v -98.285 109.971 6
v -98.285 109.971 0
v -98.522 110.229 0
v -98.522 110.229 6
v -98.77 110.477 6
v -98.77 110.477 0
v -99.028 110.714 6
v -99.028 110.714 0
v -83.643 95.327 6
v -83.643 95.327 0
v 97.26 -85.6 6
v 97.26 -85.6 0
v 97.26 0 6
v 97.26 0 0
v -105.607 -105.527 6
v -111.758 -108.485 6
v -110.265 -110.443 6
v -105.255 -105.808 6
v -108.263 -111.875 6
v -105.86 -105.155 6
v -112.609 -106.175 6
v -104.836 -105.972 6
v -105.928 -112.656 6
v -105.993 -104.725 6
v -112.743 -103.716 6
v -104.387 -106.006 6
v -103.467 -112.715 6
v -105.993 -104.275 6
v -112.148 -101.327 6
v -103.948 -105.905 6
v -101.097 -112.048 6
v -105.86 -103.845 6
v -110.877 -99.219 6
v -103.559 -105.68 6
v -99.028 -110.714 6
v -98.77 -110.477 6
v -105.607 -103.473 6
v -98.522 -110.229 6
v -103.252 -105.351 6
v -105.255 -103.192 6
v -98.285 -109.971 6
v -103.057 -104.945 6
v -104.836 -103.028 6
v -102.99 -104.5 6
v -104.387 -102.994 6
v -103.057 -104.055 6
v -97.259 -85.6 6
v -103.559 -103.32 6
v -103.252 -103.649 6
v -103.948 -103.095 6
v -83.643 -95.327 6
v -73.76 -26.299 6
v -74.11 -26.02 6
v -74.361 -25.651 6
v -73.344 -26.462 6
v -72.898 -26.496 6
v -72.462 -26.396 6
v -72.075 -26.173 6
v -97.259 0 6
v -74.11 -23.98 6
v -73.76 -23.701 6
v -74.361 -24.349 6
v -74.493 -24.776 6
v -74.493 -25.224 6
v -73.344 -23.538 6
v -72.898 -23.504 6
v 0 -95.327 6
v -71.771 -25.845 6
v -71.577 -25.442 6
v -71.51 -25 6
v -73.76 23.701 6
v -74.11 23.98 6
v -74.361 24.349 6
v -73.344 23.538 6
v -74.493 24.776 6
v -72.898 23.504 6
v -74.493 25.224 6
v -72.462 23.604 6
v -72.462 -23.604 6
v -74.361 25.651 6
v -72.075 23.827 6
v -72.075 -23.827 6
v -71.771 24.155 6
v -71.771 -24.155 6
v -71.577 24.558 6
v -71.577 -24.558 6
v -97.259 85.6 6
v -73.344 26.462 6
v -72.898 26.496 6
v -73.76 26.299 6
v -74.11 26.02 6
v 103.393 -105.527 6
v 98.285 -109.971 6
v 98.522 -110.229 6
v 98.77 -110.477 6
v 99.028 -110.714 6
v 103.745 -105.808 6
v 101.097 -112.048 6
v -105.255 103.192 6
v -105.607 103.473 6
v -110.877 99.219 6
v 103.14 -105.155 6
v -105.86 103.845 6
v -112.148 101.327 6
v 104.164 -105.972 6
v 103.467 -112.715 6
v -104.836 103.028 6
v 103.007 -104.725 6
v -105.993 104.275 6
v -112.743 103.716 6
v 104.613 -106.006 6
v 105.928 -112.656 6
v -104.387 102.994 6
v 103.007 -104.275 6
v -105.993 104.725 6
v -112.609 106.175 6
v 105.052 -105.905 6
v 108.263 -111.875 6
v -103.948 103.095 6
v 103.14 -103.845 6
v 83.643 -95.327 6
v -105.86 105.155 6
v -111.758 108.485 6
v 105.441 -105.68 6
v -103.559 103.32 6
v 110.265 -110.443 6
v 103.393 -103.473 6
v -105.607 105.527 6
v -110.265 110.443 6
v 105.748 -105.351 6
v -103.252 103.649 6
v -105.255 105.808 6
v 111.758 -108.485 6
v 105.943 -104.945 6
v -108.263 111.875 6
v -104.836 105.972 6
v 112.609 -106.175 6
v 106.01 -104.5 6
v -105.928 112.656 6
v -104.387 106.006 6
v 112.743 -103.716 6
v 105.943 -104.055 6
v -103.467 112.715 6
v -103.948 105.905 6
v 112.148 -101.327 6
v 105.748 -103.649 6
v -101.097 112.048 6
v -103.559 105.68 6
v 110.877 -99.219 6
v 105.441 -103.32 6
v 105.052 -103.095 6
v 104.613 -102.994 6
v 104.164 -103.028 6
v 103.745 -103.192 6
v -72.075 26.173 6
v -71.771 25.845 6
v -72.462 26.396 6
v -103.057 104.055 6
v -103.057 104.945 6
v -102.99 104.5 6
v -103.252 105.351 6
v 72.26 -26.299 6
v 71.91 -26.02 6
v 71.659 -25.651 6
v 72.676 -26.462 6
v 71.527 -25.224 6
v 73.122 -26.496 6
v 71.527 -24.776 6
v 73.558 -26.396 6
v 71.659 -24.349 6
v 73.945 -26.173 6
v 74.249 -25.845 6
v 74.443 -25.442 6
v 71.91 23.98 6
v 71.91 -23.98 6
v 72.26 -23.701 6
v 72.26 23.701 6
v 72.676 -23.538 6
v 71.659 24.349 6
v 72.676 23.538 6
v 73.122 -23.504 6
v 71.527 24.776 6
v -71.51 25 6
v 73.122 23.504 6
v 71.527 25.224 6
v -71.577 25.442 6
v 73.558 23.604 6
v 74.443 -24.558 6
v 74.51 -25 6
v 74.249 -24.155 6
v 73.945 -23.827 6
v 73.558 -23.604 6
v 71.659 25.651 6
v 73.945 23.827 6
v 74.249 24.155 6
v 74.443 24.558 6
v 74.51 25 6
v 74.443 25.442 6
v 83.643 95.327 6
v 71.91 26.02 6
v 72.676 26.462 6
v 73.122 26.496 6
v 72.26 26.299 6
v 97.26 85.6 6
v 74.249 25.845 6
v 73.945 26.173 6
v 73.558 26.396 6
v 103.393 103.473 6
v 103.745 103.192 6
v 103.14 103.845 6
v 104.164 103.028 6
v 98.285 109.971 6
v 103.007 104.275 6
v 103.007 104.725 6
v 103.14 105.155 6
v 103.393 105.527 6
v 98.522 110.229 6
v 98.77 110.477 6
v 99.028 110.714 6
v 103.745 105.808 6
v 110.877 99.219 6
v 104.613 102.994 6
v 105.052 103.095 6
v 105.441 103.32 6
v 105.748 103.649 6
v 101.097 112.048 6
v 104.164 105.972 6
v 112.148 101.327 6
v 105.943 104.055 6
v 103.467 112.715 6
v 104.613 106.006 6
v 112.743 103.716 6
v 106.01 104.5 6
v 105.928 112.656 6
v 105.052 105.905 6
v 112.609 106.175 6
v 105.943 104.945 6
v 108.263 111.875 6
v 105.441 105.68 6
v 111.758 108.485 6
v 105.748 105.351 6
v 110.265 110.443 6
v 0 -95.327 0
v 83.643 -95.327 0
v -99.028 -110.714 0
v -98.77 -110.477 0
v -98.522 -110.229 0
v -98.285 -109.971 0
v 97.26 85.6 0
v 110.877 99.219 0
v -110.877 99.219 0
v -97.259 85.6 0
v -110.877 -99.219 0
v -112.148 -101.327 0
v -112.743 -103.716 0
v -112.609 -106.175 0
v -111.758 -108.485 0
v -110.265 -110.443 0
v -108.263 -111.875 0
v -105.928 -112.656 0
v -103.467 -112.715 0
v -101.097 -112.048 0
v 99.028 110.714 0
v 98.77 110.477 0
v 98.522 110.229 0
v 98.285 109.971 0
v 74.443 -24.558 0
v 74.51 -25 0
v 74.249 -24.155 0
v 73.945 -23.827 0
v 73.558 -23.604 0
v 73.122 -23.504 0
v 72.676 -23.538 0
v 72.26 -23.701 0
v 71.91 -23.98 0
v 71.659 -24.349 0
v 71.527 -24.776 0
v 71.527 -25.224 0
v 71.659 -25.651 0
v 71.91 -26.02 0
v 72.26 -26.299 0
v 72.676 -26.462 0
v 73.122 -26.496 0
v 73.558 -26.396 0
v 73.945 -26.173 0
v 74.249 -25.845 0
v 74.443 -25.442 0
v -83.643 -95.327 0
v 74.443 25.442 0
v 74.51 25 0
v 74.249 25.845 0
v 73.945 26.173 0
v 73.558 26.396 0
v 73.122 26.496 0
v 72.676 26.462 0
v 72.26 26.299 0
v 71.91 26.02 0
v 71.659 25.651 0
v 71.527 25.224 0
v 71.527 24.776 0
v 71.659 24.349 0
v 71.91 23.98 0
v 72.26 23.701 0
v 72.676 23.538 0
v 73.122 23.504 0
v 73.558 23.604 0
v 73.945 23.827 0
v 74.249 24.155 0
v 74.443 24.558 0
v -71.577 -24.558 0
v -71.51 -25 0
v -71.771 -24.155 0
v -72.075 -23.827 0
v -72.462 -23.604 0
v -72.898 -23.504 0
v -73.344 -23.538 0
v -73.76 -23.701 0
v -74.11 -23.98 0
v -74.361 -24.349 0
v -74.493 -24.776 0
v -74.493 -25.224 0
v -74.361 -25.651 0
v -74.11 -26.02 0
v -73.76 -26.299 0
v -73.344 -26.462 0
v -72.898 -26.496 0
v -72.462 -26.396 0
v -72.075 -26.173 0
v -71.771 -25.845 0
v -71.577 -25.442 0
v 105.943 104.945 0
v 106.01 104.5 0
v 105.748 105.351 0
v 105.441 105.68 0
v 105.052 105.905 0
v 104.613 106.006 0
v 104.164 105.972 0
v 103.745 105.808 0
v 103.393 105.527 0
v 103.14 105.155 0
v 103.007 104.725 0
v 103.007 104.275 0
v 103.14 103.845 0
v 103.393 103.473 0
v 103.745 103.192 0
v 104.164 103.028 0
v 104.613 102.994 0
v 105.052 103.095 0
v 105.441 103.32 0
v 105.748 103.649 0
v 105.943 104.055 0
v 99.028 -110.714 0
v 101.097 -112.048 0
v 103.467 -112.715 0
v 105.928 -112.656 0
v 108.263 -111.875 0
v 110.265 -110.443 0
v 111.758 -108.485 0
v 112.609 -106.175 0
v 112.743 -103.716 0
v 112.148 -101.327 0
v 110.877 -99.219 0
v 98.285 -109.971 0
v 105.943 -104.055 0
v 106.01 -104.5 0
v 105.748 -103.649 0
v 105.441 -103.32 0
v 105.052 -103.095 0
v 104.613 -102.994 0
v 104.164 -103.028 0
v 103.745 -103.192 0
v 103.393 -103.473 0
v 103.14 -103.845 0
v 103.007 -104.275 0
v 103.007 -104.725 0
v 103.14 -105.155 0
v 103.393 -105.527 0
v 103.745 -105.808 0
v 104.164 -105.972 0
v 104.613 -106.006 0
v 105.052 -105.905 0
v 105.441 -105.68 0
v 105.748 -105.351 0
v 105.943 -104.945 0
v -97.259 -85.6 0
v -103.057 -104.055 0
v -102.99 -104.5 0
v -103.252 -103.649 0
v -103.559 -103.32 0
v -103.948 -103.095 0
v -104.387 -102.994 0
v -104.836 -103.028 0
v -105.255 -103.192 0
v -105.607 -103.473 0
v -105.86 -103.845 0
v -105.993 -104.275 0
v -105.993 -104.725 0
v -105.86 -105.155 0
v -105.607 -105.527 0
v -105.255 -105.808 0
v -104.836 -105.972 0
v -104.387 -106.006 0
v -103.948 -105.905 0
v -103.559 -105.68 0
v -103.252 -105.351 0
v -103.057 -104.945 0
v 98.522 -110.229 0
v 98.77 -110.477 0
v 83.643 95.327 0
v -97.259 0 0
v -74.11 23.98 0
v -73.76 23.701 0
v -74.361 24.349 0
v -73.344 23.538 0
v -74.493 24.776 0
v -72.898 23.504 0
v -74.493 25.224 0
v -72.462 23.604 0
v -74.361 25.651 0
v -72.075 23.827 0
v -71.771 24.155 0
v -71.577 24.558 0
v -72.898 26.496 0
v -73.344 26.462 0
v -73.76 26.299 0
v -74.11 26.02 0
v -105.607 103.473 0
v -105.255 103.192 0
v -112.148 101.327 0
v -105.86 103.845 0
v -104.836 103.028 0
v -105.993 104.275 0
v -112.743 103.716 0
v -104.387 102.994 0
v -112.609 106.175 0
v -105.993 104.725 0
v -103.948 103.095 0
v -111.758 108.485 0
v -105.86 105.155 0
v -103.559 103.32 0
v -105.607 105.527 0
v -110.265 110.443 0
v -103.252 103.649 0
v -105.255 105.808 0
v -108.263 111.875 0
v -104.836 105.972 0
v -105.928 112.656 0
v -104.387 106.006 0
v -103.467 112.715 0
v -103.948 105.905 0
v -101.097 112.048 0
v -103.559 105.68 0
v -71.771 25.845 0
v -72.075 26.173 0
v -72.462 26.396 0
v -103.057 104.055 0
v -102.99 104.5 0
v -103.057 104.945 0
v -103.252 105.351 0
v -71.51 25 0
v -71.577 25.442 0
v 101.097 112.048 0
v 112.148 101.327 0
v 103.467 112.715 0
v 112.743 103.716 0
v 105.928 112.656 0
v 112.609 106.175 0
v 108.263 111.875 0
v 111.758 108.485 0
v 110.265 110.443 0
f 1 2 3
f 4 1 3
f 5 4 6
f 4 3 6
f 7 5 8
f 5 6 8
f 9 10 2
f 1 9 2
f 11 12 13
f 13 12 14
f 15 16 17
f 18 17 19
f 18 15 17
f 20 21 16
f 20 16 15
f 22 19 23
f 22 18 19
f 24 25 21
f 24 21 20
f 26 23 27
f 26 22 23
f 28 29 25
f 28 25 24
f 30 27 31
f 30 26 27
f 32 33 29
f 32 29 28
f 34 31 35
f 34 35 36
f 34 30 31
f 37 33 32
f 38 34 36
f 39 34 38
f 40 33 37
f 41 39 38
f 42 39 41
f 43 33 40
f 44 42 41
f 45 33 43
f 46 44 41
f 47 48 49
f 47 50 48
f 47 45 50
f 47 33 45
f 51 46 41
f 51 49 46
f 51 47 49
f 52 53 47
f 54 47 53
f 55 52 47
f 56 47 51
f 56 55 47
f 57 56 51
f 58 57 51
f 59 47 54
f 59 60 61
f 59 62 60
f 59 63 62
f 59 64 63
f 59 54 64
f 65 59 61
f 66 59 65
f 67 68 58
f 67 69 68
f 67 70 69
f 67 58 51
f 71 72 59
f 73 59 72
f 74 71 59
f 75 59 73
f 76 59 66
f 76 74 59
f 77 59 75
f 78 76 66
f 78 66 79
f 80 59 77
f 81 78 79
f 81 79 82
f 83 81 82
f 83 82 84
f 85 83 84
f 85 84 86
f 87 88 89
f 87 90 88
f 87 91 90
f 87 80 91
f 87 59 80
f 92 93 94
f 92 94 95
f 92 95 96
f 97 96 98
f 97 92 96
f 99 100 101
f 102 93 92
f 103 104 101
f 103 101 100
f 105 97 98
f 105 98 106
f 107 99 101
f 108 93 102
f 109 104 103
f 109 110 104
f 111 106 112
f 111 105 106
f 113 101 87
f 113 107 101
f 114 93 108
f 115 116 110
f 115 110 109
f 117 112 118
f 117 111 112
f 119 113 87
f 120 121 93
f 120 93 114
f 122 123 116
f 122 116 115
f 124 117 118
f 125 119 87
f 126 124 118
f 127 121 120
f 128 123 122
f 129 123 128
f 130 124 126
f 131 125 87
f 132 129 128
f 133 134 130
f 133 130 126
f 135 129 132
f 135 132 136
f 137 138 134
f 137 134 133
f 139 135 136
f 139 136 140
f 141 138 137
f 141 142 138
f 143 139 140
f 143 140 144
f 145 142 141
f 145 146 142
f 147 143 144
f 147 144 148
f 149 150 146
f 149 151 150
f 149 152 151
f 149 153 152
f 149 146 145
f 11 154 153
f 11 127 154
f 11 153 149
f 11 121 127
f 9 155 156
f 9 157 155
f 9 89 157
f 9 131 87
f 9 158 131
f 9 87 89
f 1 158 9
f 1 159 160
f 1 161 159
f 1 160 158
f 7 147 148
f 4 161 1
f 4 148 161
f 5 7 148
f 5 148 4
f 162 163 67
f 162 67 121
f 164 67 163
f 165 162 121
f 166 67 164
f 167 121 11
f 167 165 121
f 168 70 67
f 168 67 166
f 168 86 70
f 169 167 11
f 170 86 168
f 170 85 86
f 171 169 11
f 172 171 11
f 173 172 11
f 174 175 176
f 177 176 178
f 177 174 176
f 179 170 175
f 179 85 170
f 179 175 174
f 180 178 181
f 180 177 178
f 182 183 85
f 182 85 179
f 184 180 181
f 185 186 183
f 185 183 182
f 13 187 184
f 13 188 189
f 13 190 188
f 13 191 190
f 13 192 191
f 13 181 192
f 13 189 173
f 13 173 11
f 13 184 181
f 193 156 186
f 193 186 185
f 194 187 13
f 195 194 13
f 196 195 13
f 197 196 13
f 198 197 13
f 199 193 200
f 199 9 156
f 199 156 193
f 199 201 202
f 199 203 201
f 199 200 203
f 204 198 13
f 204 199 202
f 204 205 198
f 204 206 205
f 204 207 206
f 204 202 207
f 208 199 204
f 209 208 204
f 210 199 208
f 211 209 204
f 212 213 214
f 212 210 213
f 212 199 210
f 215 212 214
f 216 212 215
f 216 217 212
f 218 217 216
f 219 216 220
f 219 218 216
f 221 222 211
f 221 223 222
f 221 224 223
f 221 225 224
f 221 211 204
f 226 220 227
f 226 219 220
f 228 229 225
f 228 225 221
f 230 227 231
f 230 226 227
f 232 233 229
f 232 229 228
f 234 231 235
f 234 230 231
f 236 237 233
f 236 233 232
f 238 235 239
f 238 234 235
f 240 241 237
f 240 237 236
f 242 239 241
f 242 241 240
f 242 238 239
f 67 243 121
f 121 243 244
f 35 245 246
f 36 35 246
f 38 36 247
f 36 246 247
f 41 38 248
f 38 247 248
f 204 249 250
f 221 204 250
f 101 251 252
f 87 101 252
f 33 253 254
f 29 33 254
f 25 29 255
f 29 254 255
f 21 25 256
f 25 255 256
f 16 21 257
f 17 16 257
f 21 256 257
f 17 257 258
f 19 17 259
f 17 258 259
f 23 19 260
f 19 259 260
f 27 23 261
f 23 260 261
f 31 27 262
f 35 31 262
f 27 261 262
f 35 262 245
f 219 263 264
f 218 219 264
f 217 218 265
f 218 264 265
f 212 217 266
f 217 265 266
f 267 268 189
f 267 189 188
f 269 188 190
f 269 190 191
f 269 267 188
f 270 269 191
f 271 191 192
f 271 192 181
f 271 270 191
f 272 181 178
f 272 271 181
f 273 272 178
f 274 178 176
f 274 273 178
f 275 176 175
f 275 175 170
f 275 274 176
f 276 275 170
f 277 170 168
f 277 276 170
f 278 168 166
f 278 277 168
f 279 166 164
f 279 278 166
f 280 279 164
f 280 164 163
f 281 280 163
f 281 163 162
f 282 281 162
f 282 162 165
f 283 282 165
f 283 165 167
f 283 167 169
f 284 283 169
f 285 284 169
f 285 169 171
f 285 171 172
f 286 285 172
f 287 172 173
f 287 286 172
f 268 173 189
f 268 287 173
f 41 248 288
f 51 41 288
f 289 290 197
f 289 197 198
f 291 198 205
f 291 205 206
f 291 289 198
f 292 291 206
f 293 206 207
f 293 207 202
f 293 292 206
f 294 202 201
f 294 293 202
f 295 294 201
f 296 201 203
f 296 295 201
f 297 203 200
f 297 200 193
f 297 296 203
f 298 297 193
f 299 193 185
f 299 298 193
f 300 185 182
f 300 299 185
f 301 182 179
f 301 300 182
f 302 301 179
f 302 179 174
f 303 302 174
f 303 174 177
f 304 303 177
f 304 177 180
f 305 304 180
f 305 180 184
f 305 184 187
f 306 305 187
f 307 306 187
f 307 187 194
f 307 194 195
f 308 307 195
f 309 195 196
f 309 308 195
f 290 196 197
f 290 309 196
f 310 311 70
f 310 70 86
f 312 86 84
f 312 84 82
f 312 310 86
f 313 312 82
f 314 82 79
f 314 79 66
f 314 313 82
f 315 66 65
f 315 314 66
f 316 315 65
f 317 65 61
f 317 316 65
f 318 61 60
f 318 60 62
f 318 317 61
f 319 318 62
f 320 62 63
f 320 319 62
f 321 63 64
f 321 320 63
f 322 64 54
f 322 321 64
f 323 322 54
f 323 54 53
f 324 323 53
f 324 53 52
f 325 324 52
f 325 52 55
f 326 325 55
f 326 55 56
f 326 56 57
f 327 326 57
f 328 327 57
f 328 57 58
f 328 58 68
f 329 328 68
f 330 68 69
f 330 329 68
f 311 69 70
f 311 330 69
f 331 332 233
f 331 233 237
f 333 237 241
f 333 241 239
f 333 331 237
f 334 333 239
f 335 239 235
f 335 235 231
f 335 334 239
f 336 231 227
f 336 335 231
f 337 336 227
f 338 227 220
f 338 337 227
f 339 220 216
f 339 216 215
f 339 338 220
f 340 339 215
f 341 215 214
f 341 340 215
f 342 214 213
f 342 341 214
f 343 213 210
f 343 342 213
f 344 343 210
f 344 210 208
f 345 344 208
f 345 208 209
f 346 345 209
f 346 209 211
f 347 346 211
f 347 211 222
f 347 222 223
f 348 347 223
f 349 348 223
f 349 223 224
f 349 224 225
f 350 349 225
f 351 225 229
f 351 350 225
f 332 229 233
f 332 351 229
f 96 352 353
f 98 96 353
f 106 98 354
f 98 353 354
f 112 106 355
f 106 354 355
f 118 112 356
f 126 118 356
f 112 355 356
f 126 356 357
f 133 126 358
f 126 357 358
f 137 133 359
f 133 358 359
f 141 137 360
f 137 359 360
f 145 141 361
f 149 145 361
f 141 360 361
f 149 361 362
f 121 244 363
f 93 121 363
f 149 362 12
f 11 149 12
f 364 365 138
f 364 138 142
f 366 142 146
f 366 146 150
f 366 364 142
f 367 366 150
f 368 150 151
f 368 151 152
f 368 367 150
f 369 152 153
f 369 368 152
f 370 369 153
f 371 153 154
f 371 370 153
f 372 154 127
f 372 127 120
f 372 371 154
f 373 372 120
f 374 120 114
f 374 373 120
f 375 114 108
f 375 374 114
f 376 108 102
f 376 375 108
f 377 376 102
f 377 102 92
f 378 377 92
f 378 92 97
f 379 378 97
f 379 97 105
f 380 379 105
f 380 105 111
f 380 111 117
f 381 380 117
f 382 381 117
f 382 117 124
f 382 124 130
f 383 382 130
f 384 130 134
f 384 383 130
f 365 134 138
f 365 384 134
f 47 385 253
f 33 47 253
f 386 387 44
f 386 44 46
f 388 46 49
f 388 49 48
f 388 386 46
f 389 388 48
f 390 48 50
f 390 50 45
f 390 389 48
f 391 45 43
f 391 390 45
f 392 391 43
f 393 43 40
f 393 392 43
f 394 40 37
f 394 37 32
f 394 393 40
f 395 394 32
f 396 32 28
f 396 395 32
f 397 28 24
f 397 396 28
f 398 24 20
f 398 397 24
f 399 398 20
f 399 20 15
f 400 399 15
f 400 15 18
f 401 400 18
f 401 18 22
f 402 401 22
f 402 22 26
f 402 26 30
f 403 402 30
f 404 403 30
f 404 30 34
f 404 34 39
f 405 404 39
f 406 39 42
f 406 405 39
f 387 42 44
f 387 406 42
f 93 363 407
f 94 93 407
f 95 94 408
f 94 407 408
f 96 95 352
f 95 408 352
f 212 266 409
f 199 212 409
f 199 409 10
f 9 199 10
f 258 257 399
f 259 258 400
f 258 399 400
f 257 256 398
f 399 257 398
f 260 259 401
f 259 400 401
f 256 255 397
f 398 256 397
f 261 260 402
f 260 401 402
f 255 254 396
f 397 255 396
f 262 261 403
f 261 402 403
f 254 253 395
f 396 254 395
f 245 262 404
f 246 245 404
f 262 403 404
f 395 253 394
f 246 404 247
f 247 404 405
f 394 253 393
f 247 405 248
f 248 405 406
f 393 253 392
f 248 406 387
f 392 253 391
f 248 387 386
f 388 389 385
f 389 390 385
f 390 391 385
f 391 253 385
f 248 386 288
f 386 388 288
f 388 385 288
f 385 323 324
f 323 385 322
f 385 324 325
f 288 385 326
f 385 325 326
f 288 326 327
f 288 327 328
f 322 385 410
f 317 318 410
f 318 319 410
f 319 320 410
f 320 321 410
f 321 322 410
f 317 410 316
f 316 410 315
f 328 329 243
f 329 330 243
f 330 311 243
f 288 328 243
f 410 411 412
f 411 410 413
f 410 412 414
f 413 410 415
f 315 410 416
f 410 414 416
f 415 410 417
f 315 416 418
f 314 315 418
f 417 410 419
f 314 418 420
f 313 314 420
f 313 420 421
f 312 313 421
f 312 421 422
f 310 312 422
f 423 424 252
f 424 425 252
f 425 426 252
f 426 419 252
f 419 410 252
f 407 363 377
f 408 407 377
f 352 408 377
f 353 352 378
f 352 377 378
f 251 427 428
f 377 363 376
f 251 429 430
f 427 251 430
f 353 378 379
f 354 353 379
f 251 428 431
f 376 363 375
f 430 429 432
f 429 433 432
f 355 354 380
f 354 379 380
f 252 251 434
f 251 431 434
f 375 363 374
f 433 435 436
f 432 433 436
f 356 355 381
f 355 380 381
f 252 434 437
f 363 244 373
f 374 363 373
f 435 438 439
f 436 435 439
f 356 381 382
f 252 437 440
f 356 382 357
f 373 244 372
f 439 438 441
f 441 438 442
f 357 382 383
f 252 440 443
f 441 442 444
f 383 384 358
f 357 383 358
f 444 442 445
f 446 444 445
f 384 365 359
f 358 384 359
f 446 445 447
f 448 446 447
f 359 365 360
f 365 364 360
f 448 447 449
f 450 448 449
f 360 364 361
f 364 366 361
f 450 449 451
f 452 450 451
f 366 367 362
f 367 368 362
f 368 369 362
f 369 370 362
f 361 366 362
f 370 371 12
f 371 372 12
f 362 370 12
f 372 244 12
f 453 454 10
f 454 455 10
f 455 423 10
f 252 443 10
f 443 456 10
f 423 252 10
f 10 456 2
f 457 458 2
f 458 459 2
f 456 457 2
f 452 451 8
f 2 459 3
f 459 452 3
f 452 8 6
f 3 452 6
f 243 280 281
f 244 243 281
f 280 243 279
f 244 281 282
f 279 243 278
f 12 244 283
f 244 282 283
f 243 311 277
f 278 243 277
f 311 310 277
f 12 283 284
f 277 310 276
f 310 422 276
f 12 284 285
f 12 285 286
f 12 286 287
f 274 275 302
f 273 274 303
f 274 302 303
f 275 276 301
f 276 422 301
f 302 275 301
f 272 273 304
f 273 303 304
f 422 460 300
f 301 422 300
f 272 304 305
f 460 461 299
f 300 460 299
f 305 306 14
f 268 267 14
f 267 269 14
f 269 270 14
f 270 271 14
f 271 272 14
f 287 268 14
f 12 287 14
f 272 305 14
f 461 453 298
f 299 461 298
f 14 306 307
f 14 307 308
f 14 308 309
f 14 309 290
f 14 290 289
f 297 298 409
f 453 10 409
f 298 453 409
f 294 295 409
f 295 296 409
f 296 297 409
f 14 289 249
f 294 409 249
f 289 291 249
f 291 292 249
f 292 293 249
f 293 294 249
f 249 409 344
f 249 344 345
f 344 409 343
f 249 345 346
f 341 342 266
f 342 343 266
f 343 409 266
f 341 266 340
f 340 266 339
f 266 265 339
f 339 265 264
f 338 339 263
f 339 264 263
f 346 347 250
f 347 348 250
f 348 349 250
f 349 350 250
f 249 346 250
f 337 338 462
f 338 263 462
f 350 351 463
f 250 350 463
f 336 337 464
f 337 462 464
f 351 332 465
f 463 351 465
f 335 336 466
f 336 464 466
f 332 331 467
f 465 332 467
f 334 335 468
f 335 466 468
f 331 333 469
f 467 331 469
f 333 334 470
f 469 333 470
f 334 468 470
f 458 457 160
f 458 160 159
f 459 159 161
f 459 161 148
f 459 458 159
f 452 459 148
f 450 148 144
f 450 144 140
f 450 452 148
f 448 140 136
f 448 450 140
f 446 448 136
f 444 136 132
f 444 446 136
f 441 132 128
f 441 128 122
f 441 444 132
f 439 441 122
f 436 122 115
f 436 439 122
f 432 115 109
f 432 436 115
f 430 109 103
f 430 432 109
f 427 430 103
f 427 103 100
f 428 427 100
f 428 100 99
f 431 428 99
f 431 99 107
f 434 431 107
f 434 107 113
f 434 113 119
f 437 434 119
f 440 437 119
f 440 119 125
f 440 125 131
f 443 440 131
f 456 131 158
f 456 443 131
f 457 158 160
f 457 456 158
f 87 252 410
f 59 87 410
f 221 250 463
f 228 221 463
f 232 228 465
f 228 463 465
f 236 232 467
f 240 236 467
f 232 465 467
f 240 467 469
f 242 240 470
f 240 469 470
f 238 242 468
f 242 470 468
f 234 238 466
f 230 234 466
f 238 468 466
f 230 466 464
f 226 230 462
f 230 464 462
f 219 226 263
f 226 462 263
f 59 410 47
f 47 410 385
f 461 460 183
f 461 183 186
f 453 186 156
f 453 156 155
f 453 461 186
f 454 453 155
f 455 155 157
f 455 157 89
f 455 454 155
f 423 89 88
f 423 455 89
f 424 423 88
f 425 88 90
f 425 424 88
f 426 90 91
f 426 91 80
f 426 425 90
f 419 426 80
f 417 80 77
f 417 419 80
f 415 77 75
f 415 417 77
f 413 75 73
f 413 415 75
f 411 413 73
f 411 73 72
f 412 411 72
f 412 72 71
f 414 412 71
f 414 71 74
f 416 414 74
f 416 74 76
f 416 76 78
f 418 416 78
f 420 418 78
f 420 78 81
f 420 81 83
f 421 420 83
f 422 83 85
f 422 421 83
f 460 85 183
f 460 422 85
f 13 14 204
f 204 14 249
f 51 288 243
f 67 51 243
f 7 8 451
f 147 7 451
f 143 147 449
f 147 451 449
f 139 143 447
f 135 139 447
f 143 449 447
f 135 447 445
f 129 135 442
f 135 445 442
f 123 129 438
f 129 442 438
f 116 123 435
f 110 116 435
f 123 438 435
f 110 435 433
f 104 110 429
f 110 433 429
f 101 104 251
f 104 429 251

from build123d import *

# Parameters (mm, degrees)
F0_R     = 1.5098129389
F0_R_2   = 1.5
F1_DEPTH = 6


# Not quite as in the source:
# - ends of sketch curves that miss each other by under 0.0002 mm in the source are joined


with BuildPart() as f1:
    # F0 (on Top) → F1 (new body)
    with BuildSketch(Plane.XY):
        with BuildLine():
            Line((4.5e-05, 95.32702), (-83.6431340024, 95.32702))
            Line((-83.6431340024, 95.32702), (-98.2850169252, 109.9708148351))
            Line((-98.2850169252, 109.9708148351), (-99.0283260424, 110.7142210123))
            ThreePointArc((-99.0283260424, 110.7142210123), (-110.2653878227, 110.4426468905), (-110.8769341282, 99.2189522637))
            Line((-110.8769341282, 99.2189522637), (-97.25943, 85.599669985))
            Line((-97.25943, 85.599669985), (-97.25943, -2.5e-06))
            Line((-97.25943, -2.5e-06), (-97.2594255995, -85.5996749849))
            Line((-97.2594255995, -85.5996749849), (-110.8769290275, -99.2189579637))
            ThreePointArc((-110.8769290275, -99.2189579637), (-110.2653821451, -110.4426525591), (-99.0283203508, -110.7142261032))
            Line((-99.0283203508, -110.7142261032), (-98.2850112718, -109.9708198877))
            Line((-98.2850112718, -109.9708198877), (-83.6431291018, -95.3270243))
            Line((-83.6431291018, -95.3270243), (4.99006e-05, -95.32702))
            Line((4.99006e-05, -95.32702), (83.6432191018, -95.3270243))
            Line((83.6432191018, -95.3270243), (98.2851012718, -109.9708198877))
            Line((98.2851012718, -109.9708198877), (99.0284103508, -110.7142261032))
            ThreePointArc((99.0284103508, -110.7142261032), (110.2654721451, -110.4426525591), (110.8770190275, -99.2189579637))
            Line((110.8770190275, -99.2189579637), (97.2595155995, -85.5996749849))
            Line((97.2595155995, -85.5996749849), (97.25952, -2.5e-06))
            Line((97.25952, -2.5e-06), (97.25952, 85.599669985))
            Line((97.25952, 85.599669985), (110.8770241282, 99.2189522637))
            ThreePointArc((110.8770241282, 99.2189522637), (110.2654778227, 110.4426468905), (99.0284160424, 110.7142210123))
            Line((99.0284160424, 110.7142210123), (98.2851069252, 109.9708148351))
            Line((98.2851069252, 109.9708148351), (83.6432240024, 95.32702))
            Line((83.6432240024, 95.32702), (4.5e-05, 95.32702))
        make_face()
        with Locations((-104.4999496278, -104.5000026861)):
            Circle(F0_R, mode=Mode.SUBTRACT)
        with Locations((-73.0099637148, -25.0000018767)):
            Circle(F0_R_2, mode=Mode.SUBTRACT)
        with Locations((104.5000396278, -104.5000026861)):
            Circle(F0_R, mode=Mode.SUBTRACT)
        with Locations((73.0100537148, -25.0000018767)):
            Circle(F0_R_2, mode=Mode.SUBTRACT)
        with Locations((-73.009965, 24.9999981233)):
            Circle(F0_R_2, mode=Mode.SUBTRACT)
        with Locations((-104.499955, 104.4999973139)):
            Circle(F0_R, mode=Mode.SUBTRACT)
        with Locations((73.010055, 24.9999981233)):
            Circle(F0_R_2, mode=Mode.SUBTRACT)
        with Locations((104.500045, 104.4999973139)):
            Circle(F0_R, mode=Mode.SUBTRACT)
        with BuildLine():
            Line((-99.0283260424, 110.7142210123), (-98.2850169252, 109.9708148351))
            ThreePointArc((-98.2850169252, 109.9708148351), (-98.6448610267, 110.3543268389), (-99.0283260424, 110.7142210123))
        make_face()
        with BuildLine():
            ThreePointArc((99.0284160424, 110.7142210123), (98.6449510267, 110.3543268389), (98.2851069252, 109.9708148351))
            Line((98.2851069252, 109.9708148351), (99.0284160424, 110.7142210123))
        make_face()
        with BuildLine():
            Line((-98.2850112718, -109.9708198877), (-99.0283203508, -110.7142261032))
            ThreePointArc((-99.0283203508, -110.7142261032), (-98.6448553535, -110.35433191), (-98.2850112718, -109.9708198877))
        make_face()
        with BuildLine():
            ThreePointArc((98.2851012718, -109.9708198877), (98.6449453535, -110.35433191), (99.0284103508, -110.7142261032))
            Line((99.0284103508, -110.7142261032), (98.2851012718, -109.9708198877))
        make_face()
    extrude(amount=F1_DEPTH)


solid = f1.part
